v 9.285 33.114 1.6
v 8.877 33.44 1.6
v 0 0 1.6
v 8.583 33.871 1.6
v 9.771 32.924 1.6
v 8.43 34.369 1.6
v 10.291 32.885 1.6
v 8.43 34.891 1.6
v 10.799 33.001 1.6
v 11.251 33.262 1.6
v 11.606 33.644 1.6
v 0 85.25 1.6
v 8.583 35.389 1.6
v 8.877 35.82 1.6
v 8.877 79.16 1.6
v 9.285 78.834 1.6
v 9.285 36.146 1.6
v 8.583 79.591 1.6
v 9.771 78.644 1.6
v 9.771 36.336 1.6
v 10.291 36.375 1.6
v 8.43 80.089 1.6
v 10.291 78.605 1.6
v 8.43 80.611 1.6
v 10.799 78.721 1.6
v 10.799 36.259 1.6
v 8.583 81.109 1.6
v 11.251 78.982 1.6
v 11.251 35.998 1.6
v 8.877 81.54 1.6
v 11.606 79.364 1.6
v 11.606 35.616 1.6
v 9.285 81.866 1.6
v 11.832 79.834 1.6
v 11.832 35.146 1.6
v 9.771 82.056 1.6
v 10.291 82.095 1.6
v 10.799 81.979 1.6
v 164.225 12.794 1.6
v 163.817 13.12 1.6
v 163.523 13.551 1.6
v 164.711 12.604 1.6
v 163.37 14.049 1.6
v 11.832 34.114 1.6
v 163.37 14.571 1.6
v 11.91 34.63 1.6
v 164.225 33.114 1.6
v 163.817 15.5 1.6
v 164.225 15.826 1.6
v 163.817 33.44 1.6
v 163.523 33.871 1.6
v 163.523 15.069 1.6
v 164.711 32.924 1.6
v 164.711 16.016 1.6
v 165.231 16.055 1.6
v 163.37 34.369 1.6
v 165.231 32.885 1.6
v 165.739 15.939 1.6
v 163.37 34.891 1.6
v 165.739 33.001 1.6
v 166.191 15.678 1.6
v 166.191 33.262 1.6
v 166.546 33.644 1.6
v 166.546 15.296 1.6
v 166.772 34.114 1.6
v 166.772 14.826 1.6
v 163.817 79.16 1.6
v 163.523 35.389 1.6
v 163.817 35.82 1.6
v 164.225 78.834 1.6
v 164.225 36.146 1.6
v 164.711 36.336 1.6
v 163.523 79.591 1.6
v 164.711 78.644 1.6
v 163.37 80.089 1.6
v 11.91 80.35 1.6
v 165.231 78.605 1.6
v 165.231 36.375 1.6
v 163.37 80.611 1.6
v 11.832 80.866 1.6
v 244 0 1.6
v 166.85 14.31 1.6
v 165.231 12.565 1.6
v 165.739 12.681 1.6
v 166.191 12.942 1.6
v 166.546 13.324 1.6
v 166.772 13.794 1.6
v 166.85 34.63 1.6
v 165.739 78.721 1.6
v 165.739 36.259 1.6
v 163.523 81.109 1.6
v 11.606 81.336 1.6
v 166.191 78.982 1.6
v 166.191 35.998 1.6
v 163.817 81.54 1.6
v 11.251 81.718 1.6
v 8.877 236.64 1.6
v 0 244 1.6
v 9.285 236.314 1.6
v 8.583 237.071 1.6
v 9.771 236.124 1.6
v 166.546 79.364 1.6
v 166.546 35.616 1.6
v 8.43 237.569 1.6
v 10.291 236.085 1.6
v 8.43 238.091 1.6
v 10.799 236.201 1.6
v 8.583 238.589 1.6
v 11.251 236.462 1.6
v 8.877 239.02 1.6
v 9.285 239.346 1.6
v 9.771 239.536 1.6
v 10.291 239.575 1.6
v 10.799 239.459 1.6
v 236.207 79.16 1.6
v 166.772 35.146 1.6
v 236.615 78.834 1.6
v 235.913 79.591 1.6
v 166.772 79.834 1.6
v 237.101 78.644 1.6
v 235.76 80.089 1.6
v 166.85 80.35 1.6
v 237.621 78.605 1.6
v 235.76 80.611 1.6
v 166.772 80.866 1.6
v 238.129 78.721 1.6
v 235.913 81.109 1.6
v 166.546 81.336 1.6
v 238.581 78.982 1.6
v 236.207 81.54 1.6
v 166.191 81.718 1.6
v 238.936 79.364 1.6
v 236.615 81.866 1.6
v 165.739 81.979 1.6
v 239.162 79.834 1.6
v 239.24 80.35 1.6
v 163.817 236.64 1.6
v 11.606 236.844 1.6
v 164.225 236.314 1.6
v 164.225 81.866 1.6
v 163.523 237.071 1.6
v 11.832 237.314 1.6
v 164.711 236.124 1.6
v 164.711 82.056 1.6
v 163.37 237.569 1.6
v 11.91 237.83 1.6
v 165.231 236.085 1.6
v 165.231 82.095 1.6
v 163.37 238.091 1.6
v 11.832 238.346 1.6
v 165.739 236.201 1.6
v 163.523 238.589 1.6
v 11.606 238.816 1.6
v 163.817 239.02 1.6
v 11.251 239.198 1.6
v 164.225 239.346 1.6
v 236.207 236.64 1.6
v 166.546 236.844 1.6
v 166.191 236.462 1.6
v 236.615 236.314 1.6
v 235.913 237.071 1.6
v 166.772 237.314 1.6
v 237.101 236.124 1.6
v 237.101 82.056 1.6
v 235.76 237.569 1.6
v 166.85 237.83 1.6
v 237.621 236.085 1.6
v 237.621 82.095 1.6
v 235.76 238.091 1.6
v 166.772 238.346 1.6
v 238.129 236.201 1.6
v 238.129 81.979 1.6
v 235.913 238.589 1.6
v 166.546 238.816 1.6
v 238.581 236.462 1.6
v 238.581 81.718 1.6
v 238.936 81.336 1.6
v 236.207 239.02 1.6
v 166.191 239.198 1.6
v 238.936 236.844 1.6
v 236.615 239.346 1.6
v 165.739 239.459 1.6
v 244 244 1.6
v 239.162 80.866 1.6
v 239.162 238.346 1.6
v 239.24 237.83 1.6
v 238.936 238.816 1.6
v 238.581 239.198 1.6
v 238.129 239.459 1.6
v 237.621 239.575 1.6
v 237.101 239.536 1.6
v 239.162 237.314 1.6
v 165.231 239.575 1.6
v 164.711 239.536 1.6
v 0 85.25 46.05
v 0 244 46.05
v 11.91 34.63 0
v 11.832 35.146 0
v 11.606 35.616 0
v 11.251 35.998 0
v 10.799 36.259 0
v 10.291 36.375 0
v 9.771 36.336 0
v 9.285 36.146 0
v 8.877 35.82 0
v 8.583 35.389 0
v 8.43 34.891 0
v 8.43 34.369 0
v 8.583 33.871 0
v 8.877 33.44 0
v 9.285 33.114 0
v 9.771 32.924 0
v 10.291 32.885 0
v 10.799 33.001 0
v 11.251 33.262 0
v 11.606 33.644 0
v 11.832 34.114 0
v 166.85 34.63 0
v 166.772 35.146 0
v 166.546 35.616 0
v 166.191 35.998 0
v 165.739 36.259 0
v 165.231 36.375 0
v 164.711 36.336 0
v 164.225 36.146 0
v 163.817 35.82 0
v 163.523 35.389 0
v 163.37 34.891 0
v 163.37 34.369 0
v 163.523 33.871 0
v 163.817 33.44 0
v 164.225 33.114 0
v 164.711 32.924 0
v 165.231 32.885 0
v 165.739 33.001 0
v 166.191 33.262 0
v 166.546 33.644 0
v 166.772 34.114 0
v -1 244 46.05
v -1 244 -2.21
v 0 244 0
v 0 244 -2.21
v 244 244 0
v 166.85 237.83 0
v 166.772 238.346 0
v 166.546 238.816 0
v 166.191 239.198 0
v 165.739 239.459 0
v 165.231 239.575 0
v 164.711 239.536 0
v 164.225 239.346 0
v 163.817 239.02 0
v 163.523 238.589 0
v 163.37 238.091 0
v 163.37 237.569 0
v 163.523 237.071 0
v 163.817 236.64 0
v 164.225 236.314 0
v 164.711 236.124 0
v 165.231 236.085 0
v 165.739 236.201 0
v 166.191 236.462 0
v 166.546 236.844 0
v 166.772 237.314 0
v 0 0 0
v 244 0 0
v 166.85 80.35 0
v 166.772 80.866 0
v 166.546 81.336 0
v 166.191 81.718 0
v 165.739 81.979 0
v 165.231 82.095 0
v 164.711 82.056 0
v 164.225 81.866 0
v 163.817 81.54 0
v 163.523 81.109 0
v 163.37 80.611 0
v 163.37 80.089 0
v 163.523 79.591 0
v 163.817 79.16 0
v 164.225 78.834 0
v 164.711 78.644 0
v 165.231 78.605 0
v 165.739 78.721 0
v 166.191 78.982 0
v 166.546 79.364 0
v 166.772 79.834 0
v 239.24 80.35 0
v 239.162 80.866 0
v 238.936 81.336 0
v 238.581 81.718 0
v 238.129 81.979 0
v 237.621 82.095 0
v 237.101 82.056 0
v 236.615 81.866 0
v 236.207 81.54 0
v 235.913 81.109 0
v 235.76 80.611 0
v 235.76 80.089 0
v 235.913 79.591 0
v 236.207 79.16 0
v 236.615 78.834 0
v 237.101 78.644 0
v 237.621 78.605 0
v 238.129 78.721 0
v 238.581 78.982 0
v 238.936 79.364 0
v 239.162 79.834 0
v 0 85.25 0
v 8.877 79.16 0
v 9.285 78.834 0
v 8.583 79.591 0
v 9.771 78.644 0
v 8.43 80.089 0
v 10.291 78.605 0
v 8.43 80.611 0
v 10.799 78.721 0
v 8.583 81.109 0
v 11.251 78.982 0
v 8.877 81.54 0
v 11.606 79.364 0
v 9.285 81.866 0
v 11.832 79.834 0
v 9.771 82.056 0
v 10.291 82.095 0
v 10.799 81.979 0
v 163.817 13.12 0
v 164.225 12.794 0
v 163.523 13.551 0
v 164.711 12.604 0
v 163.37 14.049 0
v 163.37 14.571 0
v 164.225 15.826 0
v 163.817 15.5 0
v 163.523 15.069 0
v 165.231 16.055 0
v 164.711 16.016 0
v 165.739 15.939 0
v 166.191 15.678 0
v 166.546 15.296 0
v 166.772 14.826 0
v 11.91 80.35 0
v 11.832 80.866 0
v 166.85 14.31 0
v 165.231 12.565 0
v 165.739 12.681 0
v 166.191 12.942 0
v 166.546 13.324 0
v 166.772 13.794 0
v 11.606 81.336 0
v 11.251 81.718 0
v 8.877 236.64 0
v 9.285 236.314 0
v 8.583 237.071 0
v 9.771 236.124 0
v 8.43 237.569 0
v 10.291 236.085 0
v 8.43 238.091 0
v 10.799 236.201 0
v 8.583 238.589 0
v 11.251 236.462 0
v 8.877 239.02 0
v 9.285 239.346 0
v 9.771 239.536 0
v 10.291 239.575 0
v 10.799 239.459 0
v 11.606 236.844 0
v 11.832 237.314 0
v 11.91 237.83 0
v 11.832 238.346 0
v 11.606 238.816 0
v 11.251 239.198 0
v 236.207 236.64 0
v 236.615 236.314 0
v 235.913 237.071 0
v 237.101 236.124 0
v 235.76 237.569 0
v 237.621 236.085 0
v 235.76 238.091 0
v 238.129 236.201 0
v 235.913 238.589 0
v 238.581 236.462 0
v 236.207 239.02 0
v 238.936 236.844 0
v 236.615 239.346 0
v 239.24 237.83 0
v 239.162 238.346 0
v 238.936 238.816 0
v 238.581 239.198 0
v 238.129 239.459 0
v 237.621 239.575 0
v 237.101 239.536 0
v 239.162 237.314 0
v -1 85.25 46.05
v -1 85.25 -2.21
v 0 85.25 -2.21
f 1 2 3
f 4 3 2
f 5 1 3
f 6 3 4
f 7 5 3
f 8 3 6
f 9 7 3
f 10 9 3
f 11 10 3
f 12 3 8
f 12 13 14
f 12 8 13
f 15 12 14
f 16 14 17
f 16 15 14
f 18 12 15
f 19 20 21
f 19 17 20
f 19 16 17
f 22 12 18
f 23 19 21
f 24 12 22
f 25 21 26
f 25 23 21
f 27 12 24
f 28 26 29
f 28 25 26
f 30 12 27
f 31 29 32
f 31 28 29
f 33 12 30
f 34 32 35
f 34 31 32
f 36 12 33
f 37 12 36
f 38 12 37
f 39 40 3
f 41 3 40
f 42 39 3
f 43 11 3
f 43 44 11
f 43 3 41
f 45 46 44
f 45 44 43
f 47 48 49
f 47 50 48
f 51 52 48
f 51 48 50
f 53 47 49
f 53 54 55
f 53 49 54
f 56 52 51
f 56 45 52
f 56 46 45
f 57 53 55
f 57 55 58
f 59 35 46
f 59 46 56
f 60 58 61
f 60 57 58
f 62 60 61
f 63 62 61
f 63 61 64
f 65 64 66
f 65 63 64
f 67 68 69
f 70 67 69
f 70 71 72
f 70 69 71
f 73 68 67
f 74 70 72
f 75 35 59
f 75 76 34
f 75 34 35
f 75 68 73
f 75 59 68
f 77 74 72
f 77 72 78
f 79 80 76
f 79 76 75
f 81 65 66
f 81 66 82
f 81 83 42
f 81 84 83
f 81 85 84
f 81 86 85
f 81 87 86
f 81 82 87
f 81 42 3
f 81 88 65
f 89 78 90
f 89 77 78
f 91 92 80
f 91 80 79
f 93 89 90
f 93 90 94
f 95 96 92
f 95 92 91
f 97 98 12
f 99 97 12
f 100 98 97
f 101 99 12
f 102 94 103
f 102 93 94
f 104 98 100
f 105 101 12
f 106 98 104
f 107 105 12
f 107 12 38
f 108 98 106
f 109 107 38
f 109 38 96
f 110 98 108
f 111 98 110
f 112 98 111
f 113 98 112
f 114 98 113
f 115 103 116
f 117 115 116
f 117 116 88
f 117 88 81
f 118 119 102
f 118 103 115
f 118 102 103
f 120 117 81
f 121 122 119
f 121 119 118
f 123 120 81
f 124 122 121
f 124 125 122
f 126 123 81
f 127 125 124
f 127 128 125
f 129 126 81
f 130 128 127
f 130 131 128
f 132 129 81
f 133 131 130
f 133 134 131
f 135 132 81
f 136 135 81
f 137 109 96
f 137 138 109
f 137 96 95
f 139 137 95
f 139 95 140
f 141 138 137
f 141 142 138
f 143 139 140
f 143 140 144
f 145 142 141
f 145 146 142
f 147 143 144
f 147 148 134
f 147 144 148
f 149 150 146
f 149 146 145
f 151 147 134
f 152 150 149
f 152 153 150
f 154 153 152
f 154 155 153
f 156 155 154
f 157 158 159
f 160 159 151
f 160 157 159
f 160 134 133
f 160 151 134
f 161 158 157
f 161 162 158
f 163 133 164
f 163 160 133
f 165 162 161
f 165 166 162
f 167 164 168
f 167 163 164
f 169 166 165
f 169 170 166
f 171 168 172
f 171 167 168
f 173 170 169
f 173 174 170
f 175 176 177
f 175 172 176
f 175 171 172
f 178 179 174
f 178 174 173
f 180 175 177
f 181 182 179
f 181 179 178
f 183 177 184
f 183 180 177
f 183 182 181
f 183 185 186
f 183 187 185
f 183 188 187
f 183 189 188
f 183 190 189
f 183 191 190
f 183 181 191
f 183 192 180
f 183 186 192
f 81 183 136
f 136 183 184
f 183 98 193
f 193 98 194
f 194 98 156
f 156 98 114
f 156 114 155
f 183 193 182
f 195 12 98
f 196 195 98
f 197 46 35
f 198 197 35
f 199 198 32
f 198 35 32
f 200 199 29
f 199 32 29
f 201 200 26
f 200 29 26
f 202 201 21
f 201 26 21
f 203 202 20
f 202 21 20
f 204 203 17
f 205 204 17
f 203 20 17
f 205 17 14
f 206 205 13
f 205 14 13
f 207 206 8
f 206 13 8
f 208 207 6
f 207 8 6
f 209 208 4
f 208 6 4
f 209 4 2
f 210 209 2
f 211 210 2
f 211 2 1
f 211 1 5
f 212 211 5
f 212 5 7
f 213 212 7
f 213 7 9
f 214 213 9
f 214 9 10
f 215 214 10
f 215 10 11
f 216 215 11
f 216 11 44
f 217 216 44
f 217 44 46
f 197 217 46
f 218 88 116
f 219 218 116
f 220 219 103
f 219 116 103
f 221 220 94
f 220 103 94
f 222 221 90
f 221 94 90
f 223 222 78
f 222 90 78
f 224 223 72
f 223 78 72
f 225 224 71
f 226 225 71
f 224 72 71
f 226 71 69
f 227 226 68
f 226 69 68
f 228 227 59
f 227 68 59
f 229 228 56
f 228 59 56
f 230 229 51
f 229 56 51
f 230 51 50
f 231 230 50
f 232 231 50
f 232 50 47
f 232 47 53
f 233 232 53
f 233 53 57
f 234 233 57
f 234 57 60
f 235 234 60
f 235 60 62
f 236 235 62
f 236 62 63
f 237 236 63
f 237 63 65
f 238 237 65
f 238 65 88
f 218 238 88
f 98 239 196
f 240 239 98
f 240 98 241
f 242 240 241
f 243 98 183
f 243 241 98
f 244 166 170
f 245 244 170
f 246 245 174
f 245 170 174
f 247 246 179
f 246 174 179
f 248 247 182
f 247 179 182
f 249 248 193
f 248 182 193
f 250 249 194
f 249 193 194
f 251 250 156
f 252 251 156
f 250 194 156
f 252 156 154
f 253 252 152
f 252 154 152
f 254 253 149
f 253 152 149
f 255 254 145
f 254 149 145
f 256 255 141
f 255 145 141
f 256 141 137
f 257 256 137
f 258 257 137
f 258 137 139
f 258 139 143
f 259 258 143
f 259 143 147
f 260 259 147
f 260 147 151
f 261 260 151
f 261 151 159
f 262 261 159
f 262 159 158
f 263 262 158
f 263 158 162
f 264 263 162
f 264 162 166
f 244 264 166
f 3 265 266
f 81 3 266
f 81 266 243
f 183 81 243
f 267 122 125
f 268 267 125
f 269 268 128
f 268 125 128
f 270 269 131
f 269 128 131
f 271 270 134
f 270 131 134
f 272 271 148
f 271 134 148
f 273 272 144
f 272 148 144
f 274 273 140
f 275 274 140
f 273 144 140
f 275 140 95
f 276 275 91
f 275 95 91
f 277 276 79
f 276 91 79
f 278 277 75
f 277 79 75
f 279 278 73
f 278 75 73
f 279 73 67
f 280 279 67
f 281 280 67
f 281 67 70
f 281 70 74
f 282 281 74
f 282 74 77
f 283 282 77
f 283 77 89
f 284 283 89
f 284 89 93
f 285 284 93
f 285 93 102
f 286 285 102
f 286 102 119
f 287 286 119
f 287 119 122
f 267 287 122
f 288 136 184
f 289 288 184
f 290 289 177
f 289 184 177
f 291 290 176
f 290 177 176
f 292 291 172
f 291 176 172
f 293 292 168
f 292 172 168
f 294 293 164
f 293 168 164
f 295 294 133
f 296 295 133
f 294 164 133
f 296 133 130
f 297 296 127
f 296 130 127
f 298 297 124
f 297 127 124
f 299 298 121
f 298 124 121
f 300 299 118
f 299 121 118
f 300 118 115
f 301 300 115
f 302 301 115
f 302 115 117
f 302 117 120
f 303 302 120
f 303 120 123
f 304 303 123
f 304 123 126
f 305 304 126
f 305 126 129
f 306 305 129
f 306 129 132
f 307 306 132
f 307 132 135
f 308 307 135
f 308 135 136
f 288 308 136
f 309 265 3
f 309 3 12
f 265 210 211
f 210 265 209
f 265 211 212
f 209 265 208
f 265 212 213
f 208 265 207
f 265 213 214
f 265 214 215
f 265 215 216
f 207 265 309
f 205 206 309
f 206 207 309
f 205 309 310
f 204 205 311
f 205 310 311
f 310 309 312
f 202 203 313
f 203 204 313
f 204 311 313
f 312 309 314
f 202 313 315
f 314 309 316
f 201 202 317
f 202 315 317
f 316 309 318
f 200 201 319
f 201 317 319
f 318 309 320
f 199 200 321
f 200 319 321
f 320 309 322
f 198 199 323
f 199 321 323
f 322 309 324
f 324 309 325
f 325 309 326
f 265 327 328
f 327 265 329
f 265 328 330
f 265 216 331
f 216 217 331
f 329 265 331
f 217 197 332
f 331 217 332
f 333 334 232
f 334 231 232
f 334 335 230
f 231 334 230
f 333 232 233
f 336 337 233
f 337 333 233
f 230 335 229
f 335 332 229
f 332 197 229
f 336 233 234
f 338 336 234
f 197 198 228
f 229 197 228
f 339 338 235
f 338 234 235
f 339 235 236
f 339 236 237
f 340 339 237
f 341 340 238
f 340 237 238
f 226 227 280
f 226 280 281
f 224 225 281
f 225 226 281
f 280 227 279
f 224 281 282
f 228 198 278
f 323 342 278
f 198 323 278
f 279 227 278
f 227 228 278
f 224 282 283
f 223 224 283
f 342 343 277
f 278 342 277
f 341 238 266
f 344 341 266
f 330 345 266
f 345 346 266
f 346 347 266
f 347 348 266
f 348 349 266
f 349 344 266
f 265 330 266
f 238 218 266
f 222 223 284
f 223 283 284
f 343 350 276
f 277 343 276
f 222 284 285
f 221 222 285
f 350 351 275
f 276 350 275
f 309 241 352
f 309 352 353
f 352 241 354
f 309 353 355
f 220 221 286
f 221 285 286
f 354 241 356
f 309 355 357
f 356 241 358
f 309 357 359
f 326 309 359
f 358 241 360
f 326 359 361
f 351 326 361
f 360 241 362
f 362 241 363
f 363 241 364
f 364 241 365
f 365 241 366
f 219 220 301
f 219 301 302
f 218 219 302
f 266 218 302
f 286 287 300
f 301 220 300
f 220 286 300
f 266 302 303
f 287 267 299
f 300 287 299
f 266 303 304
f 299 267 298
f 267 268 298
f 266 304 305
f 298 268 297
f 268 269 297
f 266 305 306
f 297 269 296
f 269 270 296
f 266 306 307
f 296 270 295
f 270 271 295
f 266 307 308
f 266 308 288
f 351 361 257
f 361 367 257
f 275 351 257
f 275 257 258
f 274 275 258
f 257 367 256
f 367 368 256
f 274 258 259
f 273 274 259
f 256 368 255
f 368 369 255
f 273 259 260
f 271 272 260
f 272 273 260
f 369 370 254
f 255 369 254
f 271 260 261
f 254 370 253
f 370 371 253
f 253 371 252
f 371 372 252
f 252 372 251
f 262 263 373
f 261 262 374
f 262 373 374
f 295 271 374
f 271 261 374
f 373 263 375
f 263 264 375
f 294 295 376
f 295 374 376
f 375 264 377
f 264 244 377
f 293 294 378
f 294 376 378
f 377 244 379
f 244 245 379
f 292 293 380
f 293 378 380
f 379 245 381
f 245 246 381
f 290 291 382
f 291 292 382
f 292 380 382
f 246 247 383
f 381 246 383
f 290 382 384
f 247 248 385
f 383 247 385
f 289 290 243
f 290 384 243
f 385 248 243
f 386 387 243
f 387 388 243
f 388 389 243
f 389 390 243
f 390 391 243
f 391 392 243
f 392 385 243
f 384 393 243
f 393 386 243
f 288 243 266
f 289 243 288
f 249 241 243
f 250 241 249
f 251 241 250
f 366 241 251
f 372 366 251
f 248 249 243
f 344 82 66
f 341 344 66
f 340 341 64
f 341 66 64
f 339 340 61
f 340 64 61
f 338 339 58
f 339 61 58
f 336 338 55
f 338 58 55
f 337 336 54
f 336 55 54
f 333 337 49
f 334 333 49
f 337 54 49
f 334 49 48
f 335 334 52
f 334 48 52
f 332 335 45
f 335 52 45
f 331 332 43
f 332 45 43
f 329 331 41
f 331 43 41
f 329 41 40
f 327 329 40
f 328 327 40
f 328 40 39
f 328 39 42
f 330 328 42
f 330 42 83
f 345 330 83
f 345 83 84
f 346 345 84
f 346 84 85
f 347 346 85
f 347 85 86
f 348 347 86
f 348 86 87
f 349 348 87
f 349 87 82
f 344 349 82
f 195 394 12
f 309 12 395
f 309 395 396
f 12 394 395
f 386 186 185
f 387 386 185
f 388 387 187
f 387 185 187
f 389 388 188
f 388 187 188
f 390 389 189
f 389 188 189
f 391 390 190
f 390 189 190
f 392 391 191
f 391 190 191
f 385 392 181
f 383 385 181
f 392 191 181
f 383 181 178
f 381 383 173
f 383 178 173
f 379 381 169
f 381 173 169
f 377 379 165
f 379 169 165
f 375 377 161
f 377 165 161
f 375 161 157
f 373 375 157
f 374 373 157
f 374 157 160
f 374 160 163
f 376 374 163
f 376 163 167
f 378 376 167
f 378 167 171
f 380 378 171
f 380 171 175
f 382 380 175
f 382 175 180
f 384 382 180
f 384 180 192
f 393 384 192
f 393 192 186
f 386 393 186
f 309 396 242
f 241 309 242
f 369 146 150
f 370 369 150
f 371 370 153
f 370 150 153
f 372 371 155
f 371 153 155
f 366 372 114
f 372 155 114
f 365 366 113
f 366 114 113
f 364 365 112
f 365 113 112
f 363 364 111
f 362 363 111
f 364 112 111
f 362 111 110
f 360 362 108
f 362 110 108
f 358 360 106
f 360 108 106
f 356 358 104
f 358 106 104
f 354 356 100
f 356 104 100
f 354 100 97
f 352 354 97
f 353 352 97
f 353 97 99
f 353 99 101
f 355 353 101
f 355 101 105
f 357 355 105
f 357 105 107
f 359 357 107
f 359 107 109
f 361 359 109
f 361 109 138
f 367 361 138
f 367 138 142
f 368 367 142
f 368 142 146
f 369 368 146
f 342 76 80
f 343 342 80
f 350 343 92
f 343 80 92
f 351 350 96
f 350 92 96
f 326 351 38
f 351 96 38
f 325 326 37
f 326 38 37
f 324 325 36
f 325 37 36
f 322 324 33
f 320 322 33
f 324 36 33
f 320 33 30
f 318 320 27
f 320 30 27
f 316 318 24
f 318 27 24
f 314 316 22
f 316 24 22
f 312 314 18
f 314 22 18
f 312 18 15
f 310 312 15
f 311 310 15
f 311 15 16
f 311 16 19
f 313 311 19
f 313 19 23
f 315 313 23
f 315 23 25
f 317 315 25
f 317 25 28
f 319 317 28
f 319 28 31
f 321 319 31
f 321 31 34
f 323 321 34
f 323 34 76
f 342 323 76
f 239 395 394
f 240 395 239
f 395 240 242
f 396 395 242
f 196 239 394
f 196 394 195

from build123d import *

# Parameters (mm, degrees)
SKETCH_1_W           = 244
SKETCH_1_H           = 244
EXTRUDE_1_DEPTH      = 1.6
SKETCH_2_R           = 1.75
CUT_EXTRUDE_1_DEPTH  = 346.071818612
EXTRUDE_2_DEPTH      = 44.45
EXTRUDE_2_DEPTH_BACK = 3.81
SKETCH_3_W           = 1
SKETCH_3_H           = 158.75


with BuildPart() as part:
    # 草图1 → 凸台-拉伸1 (new body)
    with BuildSketch(Plane.XY):
        with Locations((122, 122)):
            Rectangle(SKETCH_1_W, SKETCH_1_H)
    extrude(amount=EXTRUDE_1_DEPTH)

    # 草图2 → 切除-拉伸1 (cut, through all)
    with BuildSketch(Plane.XY.offset(1.6)):
        with Locations((10.16, 34.63)):
            Circle(SKETCH_2_R)
        with Locations((10.16, 80.35)):
            Circle(SKETCH_2_R)
        with Locations((165.1, 34.63)):
            Circle(SKETCH_2_R)
        with Locations((165.1, 80.35)):
            Circle(SKETCH_2_R)
        with Locations((165.1, 14.31)):
            Circle(SKETCH_2_R)
        with Locations((237.49, 80.35)):
            Circle(SKETCH_2_R)
        with Locations((10.16, 237.83)):
            Circle(SKETCH_2_R)
        with Locations((165.1, 237.83)):
            Circle(SKETCH_2_R)
        with Locations((237.49, 237.83)):
            Circle(SKETCH_2_R)
    extrude(amount=-CUT_EXTRUDE_1_DEPTH, mode=Mode.SUBTRACT)

    # 草图3 → 凸台-拉伸2 (add, two sides: drawn at the far end of the back side and taken through both)
    with BuildSketch(Plane.XY.offset(1.6).offset(-EXTRUDE_2_DEPTH_BACK)):
        with Locations((-0.5, 164.625)):
            Rectangle(SKETCH_3_W, SKETCH_3_H)
    extrude(amount=EXTRUDE_2_DEPTH + EXTRUDE_2_DEPTH_BACK)


solid = part.part
